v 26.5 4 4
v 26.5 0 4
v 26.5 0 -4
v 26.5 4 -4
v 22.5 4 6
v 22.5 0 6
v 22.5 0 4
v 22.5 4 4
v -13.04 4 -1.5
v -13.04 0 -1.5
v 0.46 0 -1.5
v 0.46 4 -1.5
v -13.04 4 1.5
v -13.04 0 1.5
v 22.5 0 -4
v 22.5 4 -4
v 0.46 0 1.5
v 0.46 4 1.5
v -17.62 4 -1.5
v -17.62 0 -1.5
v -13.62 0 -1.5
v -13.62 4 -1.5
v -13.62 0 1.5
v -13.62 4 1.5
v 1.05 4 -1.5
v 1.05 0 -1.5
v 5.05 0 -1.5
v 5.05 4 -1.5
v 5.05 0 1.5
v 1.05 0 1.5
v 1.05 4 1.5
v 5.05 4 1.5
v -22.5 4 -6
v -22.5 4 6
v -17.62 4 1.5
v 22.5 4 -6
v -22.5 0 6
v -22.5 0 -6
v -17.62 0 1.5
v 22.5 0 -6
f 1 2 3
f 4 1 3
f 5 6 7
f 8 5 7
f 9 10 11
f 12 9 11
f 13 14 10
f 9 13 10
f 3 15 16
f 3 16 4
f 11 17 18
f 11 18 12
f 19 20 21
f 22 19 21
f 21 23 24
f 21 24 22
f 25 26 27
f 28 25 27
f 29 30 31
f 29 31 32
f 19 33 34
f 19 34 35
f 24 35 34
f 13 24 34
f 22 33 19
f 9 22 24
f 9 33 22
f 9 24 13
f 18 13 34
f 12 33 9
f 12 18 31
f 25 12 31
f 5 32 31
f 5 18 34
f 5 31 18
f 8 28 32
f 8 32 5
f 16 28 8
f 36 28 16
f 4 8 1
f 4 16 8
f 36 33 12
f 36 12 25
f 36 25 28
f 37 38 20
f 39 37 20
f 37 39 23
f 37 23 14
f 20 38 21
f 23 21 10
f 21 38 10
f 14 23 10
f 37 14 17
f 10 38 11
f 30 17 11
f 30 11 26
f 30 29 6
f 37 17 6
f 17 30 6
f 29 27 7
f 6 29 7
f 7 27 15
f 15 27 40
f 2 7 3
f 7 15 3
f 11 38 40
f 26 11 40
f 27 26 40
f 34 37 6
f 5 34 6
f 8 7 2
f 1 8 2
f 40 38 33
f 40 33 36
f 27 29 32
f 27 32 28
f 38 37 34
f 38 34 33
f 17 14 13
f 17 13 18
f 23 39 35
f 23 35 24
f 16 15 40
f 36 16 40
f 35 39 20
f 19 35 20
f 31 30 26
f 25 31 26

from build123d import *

# Parameters (mm, degrees)
SKETCH1_W               = 45
SKETCH1_H               = 12
BOSS_EXTRUDE1_DEPTH     = 4
SKETCH2_W               = 8
SKETCH2_H               = 8
BOSS_EXTRUDE2_DEPTH     = 4
SKETCH4_W               = 13.5
SKETCH4_H               = 3
CUT_EXTRUDE2_DEPTH      = 5
SKETCH4_3_W             = 4
SKETCH4_3_H             = 3
CUT_EXTRUDE_THIN2_DEPTH = 4
LPATTERN1_COUNT         = 2
LPATTERN1_PITCH         = 18.67


with BuildPart() as part:
    # Sketch1 → Boss-Extrude1 (new body)
    with BuildSketch(Plane(origin=(0, 0, 0), x_dir=(1, 0, 0), z_dir=(0, 1, 0))):
        Rectangle(SKETCH1_W, SKETCH1_H)
    extrude(amount=BOSS_EXTRUDE1_DEPTH)

    # Sketch2 → Boss-Extrude2 (add)
    with BuildSketch(Plane(origin=(0, 0, 0), x_dir=(1, 0, 0), z_dir=(0, 1, 0))):
        with Locations((22.5, 0)):
            Rectangle(SKETCH2_W, SKETCH2_H)
    extrude(amount=BOSS_EXTRUDE2_DEPTH)

    # Sketch4 → Cut-Extrude2 (cut, through all)
    with BuildSketch(Plane(origin=(0, 0, 0), x_dir=(1, 0, 0), z_dir=(0, 1, 0))):
        with Locations((-6.29, 0)):
            Rectangle(SKETCH4_W, SKETCH4_H)
    extrude(amount=CUT_EXTRUDE2_DEPTH, mode=Mode.SUBTRACT)

    # Sketch4<3> → Cut-Extrude-Thin2 (cut)
    with BuildSketch(Plane(origin=(0, 0, 0), x_dir=(1, 0, 0), z_dir=(0, 1, 0))):
        with Locations((3.05, 0)):
            Rectangle(SKETCH4_3_W, SKETCH4_3_H)
    cut_extrude_thin2 = extrude(amount=CUT_EXTRUDE_THIN2_DEPTH, mode=Mode.SUBTRACT)

    # LPattern1: Cut-Extrude-Thin2 ×2
    with Locations(*[(-i * LPATTERN1_PITCH, 0, 0) for i in range(1, LPATTERN1_COUNT)]):
        add(cut_extrude_thin2, mode=Mode.SUBTRACT)


solid = part.part
